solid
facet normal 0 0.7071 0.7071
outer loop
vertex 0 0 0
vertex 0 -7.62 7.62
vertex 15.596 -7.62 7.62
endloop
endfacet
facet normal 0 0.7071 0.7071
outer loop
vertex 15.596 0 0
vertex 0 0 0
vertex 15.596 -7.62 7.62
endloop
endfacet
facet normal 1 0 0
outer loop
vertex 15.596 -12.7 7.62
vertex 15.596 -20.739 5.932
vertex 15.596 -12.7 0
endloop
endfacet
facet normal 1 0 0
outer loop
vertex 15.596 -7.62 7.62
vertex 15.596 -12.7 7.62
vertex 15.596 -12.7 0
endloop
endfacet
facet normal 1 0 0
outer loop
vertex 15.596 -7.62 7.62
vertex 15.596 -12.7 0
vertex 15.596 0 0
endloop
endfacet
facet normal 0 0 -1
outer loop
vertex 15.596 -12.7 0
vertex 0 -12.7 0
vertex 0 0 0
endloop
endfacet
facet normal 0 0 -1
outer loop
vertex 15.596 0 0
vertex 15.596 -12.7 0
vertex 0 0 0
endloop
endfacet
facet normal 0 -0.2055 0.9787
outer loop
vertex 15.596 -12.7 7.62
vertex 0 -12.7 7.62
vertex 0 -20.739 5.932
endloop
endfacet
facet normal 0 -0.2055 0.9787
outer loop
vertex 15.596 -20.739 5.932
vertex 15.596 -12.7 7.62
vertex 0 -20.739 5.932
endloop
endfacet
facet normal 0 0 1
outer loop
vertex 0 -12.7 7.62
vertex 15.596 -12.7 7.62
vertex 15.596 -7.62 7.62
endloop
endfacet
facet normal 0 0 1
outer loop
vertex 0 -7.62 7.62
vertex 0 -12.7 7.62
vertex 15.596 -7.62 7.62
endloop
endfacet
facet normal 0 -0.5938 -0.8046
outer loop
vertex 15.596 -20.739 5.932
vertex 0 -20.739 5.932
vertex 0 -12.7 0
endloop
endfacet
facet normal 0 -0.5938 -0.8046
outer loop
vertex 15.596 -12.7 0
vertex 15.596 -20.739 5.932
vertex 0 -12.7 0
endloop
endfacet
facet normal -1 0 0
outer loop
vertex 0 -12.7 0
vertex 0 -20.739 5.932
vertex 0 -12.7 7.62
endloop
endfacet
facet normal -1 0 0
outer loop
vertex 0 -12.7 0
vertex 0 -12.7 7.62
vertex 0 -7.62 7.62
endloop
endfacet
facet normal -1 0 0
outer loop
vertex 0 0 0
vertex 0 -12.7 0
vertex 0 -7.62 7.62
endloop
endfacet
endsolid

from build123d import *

# Parameters (mm, degrees)
F0_W     = 12.7
F0_H     = 7.62
F1_DEPTH = 15.5956
F2_SIZE  = 7.61999


# Not quite as in the source:
# - a fillet or chamfer is up to 0.001 mm smaller than in the source, because OpenCascade refuses the exact size


with BuildPart() as f1:
    # F0 (on Right) → F1 (new body)
    with BuildSketch(Plane.YZ):
        with Locations((-6.35, 3.81)):
            Rectangle(F0_W, F0_H)
        Polygon((-20.7394696772, 5.931511987), (-12.7, 0), (-12.7, 7.62), align=None)
    extrude(amount=F1_DEPTH)

    # F2 (size 7.62 in the source; OpenCascade refuses exactly that, so slightly less here)
    f2_edges = [f1.edges().sort_by_distance(p)[0] for p in [
        (7.7978, 0, 7.62),
    ]]
    chamfer(f2_edges, length=F2_SIZE)


solid = f1.part
